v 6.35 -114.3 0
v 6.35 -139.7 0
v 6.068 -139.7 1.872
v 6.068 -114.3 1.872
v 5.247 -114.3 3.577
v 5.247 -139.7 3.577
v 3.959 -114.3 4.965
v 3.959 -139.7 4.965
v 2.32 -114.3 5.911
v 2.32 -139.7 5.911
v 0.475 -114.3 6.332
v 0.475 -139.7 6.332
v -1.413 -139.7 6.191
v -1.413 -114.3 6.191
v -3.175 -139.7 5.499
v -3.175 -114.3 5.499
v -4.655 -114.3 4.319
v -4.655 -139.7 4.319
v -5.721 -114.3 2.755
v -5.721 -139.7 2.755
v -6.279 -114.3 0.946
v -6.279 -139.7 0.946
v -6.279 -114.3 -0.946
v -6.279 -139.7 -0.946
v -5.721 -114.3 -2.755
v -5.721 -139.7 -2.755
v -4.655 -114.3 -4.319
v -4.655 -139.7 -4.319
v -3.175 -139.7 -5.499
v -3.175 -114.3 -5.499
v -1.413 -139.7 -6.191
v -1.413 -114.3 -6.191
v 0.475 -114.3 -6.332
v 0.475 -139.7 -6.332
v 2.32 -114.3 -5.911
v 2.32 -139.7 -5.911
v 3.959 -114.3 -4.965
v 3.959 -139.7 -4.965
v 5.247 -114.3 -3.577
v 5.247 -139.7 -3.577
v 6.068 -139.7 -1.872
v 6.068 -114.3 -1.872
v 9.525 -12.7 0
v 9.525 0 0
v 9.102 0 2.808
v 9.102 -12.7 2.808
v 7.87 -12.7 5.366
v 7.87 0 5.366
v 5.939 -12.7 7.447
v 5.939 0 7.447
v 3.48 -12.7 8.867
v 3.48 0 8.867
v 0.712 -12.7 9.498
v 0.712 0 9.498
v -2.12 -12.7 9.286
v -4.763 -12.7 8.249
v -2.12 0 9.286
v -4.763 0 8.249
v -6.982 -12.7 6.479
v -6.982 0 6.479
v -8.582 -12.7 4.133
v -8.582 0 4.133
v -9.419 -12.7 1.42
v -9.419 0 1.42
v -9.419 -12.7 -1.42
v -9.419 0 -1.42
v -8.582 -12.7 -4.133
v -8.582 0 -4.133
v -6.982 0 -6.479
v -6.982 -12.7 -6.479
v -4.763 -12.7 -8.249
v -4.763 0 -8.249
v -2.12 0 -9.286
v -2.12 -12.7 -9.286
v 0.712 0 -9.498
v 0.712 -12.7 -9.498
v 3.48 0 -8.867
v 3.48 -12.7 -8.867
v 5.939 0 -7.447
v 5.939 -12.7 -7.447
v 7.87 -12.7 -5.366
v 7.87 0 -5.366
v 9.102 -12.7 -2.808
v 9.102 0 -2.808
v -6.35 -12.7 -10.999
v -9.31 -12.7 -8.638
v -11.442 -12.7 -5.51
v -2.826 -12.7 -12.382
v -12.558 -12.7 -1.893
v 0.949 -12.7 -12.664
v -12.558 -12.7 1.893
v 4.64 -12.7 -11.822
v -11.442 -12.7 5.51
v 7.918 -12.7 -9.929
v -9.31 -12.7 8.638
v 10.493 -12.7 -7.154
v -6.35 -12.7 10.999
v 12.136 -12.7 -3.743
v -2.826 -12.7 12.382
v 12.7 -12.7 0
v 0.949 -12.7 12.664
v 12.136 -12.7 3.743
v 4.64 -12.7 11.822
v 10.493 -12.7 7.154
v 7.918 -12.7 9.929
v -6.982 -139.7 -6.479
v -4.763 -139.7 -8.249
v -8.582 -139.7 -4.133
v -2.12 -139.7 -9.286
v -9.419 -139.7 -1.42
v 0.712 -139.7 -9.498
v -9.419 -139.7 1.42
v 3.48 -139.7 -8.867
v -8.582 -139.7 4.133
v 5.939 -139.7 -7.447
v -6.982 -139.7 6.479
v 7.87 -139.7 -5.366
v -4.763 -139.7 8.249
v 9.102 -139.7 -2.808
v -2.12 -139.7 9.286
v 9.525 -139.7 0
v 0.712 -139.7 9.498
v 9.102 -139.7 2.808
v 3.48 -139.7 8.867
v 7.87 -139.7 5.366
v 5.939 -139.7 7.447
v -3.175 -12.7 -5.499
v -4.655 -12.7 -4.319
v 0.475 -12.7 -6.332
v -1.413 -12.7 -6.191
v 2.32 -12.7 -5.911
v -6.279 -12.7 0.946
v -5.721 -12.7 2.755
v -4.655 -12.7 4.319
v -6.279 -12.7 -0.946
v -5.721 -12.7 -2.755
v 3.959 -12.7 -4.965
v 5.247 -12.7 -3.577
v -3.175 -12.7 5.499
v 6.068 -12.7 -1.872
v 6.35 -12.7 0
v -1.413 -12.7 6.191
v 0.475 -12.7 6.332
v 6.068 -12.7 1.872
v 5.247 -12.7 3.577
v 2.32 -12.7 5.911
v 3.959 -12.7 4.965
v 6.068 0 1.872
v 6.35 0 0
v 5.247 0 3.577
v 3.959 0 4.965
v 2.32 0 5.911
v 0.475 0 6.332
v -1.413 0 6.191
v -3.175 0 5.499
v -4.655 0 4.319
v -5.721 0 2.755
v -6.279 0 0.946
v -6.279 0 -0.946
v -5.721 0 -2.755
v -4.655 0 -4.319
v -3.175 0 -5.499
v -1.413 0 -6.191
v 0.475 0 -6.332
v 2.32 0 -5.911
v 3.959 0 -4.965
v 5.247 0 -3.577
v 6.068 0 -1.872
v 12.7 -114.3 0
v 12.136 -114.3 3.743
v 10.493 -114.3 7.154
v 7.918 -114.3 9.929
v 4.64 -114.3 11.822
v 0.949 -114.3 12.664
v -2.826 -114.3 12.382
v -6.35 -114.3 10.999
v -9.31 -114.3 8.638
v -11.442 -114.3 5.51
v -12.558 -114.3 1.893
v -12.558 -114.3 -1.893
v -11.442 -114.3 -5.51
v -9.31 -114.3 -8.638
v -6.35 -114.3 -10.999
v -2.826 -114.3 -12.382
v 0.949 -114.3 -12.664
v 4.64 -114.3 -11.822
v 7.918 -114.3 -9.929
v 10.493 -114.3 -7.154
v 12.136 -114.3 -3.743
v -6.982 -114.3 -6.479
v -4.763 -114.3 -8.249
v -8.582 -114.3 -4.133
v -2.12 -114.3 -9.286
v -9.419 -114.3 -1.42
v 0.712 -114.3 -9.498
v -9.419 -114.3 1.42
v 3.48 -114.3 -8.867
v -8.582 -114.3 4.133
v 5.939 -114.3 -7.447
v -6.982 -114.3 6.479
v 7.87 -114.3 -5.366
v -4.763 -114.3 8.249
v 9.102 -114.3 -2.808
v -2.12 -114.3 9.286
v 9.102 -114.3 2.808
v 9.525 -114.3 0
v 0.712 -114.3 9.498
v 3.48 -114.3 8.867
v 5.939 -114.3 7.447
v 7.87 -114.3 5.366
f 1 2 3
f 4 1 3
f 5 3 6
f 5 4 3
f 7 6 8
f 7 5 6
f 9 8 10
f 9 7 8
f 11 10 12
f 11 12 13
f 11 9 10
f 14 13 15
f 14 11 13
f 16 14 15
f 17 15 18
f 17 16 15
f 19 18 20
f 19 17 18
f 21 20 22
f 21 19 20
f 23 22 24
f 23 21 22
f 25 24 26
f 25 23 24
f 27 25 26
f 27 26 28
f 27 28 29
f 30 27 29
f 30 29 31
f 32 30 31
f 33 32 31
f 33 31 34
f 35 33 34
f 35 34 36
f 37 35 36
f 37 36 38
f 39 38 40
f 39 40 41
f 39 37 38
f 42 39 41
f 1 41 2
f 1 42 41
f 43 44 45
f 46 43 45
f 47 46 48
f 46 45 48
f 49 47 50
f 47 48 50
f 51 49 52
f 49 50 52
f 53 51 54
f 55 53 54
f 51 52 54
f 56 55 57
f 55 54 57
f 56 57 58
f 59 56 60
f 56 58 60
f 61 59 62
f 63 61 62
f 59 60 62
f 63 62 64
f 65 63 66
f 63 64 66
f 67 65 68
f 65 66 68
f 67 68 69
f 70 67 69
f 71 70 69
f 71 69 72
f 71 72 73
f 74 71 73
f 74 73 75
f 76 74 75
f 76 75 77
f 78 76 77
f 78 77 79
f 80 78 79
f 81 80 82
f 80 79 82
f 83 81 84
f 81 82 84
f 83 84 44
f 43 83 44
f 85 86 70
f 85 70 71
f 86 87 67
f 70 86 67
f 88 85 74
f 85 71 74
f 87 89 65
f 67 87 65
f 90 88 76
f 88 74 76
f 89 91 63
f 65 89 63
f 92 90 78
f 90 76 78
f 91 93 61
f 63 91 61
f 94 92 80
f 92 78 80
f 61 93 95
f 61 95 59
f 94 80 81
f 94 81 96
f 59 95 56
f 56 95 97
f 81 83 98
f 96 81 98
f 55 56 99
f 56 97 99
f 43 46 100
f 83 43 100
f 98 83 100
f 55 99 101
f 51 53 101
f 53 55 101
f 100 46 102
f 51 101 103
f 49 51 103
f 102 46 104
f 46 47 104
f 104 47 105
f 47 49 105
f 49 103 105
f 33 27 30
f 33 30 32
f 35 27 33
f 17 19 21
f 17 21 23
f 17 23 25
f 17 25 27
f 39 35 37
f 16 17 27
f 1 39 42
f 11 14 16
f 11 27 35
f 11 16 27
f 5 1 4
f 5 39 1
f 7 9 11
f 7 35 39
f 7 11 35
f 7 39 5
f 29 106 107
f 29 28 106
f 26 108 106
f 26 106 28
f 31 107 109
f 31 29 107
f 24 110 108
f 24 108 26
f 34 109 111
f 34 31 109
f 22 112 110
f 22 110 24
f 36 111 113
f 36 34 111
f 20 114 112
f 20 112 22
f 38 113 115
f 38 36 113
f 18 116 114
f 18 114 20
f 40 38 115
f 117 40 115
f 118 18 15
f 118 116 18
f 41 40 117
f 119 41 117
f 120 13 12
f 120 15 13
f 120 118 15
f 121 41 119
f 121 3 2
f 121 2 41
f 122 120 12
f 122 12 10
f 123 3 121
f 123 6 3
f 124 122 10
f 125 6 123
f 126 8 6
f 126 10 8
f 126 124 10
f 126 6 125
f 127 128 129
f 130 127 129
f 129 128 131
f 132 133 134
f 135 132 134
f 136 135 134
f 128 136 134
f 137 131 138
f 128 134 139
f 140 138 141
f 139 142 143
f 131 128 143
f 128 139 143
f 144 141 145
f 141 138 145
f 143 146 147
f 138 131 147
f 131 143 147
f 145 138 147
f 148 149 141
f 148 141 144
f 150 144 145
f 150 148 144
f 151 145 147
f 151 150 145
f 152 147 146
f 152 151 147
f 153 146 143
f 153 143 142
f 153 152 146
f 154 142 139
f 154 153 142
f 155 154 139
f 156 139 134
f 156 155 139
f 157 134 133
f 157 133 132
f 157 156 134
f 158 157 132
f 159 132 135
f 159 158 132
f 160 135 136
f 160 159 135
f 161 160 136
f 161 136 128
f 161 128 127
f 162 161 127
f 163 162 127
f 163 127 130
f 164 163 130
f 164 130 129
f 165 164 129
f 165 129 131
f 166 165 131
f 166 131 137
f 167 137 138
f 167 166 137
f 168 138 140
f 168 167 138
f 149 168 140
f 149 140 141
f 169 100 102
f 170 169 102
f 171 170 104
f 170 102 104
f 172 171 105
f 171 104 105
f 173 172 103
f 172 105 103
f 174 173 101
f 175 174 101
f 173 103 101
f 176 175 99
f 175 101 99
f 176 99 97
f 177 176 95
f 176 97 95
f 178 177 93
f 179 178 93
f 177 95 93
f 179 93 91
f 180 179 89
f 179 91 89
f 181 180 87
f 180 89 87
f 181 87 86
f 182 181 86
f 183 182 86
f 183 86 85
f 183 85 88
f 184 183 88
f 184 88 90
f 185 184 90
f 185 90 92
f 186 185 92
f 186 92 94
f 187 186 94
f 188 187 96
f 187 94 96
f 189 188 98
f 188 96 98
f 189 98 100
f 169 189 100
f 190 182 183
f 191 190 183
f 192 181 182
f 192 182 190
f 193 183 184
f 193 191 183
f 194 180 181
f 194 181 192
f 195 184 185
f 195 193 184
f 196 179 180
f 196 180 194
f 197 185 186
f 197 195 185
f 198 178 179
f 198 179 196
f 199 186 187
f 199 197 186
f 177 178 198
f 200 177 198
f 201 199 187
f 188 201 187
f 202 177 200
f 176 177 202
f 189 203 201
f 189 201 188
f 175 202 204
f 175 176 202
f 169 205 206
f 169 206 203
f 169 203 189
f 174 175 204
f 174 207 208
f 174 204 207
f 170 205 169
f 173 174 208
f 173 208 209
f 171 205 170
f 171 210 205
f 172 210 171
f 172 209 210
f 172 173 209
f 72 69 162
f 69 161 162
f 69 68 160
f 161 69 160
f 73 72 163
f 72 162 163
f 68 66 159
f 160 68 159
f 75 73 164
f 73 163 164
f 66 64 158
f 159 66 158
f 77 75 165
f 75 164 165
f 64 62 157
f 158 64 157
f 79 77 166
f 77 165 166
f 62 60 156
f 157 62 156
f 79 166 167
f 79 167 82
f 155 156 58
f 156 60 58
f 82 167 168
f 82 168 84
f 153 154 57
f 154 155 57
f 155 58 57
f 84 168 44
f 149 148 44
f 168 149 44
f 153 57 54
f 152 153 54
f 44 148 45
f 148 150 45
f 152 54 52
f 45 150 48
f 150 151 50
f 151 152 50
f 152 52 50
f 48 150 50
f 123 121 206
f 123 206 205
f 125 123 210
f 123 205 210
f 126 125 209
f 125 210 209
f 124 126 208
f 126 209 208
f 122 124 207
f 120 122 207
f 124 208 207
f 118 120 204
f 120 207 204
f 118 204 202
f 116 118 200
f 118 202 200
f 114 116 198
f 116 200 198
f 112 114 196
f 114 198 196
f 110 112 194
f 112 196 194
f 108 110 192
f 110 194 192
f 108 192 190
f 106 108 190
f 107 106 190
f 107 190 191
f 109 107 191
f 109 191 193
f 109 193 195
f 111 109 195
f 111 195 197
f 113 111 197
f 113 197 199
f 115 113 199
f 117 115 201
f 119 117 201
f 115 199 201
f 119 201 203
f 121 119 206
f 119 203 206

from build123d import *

# Parameters (mm, degrees)
F0_R     = 9.525
F0_R_2   = 6.35
F1_DEPTH = 12.7
F2_R     = 12.7
F3_DEPTH = 101.6
F4_R     = 9.525
F4_R_2   = 6.35
F5_DEPTH = 25.4


with BuildPart() as f1:
    # F0 (on Front) → F1 (new body)
    with BuildSketch(Plane.XZ):
        Circle(F0_R)
        Circle(F0_R_2, mode=Mode.SUBTRACT)
    extrude(amount=F1_DEPTH)

    # F2 (on face) → F3 (join)
    with BuildSketch(Plane.XZ.offset(12.7)):
        Circle(F2_R)
    extrude(amount=F3_DEPTH)

    # F4 (on face) → F5 (join)
    with BuildSketch(Plane.XZ.offset(114.3)):
        Circle(F4_R)
        Circle(F4_R_2, mode=Mode.SUBTRACT)
    extrude(amount=F5_DEPTH)


solid = f1.part
